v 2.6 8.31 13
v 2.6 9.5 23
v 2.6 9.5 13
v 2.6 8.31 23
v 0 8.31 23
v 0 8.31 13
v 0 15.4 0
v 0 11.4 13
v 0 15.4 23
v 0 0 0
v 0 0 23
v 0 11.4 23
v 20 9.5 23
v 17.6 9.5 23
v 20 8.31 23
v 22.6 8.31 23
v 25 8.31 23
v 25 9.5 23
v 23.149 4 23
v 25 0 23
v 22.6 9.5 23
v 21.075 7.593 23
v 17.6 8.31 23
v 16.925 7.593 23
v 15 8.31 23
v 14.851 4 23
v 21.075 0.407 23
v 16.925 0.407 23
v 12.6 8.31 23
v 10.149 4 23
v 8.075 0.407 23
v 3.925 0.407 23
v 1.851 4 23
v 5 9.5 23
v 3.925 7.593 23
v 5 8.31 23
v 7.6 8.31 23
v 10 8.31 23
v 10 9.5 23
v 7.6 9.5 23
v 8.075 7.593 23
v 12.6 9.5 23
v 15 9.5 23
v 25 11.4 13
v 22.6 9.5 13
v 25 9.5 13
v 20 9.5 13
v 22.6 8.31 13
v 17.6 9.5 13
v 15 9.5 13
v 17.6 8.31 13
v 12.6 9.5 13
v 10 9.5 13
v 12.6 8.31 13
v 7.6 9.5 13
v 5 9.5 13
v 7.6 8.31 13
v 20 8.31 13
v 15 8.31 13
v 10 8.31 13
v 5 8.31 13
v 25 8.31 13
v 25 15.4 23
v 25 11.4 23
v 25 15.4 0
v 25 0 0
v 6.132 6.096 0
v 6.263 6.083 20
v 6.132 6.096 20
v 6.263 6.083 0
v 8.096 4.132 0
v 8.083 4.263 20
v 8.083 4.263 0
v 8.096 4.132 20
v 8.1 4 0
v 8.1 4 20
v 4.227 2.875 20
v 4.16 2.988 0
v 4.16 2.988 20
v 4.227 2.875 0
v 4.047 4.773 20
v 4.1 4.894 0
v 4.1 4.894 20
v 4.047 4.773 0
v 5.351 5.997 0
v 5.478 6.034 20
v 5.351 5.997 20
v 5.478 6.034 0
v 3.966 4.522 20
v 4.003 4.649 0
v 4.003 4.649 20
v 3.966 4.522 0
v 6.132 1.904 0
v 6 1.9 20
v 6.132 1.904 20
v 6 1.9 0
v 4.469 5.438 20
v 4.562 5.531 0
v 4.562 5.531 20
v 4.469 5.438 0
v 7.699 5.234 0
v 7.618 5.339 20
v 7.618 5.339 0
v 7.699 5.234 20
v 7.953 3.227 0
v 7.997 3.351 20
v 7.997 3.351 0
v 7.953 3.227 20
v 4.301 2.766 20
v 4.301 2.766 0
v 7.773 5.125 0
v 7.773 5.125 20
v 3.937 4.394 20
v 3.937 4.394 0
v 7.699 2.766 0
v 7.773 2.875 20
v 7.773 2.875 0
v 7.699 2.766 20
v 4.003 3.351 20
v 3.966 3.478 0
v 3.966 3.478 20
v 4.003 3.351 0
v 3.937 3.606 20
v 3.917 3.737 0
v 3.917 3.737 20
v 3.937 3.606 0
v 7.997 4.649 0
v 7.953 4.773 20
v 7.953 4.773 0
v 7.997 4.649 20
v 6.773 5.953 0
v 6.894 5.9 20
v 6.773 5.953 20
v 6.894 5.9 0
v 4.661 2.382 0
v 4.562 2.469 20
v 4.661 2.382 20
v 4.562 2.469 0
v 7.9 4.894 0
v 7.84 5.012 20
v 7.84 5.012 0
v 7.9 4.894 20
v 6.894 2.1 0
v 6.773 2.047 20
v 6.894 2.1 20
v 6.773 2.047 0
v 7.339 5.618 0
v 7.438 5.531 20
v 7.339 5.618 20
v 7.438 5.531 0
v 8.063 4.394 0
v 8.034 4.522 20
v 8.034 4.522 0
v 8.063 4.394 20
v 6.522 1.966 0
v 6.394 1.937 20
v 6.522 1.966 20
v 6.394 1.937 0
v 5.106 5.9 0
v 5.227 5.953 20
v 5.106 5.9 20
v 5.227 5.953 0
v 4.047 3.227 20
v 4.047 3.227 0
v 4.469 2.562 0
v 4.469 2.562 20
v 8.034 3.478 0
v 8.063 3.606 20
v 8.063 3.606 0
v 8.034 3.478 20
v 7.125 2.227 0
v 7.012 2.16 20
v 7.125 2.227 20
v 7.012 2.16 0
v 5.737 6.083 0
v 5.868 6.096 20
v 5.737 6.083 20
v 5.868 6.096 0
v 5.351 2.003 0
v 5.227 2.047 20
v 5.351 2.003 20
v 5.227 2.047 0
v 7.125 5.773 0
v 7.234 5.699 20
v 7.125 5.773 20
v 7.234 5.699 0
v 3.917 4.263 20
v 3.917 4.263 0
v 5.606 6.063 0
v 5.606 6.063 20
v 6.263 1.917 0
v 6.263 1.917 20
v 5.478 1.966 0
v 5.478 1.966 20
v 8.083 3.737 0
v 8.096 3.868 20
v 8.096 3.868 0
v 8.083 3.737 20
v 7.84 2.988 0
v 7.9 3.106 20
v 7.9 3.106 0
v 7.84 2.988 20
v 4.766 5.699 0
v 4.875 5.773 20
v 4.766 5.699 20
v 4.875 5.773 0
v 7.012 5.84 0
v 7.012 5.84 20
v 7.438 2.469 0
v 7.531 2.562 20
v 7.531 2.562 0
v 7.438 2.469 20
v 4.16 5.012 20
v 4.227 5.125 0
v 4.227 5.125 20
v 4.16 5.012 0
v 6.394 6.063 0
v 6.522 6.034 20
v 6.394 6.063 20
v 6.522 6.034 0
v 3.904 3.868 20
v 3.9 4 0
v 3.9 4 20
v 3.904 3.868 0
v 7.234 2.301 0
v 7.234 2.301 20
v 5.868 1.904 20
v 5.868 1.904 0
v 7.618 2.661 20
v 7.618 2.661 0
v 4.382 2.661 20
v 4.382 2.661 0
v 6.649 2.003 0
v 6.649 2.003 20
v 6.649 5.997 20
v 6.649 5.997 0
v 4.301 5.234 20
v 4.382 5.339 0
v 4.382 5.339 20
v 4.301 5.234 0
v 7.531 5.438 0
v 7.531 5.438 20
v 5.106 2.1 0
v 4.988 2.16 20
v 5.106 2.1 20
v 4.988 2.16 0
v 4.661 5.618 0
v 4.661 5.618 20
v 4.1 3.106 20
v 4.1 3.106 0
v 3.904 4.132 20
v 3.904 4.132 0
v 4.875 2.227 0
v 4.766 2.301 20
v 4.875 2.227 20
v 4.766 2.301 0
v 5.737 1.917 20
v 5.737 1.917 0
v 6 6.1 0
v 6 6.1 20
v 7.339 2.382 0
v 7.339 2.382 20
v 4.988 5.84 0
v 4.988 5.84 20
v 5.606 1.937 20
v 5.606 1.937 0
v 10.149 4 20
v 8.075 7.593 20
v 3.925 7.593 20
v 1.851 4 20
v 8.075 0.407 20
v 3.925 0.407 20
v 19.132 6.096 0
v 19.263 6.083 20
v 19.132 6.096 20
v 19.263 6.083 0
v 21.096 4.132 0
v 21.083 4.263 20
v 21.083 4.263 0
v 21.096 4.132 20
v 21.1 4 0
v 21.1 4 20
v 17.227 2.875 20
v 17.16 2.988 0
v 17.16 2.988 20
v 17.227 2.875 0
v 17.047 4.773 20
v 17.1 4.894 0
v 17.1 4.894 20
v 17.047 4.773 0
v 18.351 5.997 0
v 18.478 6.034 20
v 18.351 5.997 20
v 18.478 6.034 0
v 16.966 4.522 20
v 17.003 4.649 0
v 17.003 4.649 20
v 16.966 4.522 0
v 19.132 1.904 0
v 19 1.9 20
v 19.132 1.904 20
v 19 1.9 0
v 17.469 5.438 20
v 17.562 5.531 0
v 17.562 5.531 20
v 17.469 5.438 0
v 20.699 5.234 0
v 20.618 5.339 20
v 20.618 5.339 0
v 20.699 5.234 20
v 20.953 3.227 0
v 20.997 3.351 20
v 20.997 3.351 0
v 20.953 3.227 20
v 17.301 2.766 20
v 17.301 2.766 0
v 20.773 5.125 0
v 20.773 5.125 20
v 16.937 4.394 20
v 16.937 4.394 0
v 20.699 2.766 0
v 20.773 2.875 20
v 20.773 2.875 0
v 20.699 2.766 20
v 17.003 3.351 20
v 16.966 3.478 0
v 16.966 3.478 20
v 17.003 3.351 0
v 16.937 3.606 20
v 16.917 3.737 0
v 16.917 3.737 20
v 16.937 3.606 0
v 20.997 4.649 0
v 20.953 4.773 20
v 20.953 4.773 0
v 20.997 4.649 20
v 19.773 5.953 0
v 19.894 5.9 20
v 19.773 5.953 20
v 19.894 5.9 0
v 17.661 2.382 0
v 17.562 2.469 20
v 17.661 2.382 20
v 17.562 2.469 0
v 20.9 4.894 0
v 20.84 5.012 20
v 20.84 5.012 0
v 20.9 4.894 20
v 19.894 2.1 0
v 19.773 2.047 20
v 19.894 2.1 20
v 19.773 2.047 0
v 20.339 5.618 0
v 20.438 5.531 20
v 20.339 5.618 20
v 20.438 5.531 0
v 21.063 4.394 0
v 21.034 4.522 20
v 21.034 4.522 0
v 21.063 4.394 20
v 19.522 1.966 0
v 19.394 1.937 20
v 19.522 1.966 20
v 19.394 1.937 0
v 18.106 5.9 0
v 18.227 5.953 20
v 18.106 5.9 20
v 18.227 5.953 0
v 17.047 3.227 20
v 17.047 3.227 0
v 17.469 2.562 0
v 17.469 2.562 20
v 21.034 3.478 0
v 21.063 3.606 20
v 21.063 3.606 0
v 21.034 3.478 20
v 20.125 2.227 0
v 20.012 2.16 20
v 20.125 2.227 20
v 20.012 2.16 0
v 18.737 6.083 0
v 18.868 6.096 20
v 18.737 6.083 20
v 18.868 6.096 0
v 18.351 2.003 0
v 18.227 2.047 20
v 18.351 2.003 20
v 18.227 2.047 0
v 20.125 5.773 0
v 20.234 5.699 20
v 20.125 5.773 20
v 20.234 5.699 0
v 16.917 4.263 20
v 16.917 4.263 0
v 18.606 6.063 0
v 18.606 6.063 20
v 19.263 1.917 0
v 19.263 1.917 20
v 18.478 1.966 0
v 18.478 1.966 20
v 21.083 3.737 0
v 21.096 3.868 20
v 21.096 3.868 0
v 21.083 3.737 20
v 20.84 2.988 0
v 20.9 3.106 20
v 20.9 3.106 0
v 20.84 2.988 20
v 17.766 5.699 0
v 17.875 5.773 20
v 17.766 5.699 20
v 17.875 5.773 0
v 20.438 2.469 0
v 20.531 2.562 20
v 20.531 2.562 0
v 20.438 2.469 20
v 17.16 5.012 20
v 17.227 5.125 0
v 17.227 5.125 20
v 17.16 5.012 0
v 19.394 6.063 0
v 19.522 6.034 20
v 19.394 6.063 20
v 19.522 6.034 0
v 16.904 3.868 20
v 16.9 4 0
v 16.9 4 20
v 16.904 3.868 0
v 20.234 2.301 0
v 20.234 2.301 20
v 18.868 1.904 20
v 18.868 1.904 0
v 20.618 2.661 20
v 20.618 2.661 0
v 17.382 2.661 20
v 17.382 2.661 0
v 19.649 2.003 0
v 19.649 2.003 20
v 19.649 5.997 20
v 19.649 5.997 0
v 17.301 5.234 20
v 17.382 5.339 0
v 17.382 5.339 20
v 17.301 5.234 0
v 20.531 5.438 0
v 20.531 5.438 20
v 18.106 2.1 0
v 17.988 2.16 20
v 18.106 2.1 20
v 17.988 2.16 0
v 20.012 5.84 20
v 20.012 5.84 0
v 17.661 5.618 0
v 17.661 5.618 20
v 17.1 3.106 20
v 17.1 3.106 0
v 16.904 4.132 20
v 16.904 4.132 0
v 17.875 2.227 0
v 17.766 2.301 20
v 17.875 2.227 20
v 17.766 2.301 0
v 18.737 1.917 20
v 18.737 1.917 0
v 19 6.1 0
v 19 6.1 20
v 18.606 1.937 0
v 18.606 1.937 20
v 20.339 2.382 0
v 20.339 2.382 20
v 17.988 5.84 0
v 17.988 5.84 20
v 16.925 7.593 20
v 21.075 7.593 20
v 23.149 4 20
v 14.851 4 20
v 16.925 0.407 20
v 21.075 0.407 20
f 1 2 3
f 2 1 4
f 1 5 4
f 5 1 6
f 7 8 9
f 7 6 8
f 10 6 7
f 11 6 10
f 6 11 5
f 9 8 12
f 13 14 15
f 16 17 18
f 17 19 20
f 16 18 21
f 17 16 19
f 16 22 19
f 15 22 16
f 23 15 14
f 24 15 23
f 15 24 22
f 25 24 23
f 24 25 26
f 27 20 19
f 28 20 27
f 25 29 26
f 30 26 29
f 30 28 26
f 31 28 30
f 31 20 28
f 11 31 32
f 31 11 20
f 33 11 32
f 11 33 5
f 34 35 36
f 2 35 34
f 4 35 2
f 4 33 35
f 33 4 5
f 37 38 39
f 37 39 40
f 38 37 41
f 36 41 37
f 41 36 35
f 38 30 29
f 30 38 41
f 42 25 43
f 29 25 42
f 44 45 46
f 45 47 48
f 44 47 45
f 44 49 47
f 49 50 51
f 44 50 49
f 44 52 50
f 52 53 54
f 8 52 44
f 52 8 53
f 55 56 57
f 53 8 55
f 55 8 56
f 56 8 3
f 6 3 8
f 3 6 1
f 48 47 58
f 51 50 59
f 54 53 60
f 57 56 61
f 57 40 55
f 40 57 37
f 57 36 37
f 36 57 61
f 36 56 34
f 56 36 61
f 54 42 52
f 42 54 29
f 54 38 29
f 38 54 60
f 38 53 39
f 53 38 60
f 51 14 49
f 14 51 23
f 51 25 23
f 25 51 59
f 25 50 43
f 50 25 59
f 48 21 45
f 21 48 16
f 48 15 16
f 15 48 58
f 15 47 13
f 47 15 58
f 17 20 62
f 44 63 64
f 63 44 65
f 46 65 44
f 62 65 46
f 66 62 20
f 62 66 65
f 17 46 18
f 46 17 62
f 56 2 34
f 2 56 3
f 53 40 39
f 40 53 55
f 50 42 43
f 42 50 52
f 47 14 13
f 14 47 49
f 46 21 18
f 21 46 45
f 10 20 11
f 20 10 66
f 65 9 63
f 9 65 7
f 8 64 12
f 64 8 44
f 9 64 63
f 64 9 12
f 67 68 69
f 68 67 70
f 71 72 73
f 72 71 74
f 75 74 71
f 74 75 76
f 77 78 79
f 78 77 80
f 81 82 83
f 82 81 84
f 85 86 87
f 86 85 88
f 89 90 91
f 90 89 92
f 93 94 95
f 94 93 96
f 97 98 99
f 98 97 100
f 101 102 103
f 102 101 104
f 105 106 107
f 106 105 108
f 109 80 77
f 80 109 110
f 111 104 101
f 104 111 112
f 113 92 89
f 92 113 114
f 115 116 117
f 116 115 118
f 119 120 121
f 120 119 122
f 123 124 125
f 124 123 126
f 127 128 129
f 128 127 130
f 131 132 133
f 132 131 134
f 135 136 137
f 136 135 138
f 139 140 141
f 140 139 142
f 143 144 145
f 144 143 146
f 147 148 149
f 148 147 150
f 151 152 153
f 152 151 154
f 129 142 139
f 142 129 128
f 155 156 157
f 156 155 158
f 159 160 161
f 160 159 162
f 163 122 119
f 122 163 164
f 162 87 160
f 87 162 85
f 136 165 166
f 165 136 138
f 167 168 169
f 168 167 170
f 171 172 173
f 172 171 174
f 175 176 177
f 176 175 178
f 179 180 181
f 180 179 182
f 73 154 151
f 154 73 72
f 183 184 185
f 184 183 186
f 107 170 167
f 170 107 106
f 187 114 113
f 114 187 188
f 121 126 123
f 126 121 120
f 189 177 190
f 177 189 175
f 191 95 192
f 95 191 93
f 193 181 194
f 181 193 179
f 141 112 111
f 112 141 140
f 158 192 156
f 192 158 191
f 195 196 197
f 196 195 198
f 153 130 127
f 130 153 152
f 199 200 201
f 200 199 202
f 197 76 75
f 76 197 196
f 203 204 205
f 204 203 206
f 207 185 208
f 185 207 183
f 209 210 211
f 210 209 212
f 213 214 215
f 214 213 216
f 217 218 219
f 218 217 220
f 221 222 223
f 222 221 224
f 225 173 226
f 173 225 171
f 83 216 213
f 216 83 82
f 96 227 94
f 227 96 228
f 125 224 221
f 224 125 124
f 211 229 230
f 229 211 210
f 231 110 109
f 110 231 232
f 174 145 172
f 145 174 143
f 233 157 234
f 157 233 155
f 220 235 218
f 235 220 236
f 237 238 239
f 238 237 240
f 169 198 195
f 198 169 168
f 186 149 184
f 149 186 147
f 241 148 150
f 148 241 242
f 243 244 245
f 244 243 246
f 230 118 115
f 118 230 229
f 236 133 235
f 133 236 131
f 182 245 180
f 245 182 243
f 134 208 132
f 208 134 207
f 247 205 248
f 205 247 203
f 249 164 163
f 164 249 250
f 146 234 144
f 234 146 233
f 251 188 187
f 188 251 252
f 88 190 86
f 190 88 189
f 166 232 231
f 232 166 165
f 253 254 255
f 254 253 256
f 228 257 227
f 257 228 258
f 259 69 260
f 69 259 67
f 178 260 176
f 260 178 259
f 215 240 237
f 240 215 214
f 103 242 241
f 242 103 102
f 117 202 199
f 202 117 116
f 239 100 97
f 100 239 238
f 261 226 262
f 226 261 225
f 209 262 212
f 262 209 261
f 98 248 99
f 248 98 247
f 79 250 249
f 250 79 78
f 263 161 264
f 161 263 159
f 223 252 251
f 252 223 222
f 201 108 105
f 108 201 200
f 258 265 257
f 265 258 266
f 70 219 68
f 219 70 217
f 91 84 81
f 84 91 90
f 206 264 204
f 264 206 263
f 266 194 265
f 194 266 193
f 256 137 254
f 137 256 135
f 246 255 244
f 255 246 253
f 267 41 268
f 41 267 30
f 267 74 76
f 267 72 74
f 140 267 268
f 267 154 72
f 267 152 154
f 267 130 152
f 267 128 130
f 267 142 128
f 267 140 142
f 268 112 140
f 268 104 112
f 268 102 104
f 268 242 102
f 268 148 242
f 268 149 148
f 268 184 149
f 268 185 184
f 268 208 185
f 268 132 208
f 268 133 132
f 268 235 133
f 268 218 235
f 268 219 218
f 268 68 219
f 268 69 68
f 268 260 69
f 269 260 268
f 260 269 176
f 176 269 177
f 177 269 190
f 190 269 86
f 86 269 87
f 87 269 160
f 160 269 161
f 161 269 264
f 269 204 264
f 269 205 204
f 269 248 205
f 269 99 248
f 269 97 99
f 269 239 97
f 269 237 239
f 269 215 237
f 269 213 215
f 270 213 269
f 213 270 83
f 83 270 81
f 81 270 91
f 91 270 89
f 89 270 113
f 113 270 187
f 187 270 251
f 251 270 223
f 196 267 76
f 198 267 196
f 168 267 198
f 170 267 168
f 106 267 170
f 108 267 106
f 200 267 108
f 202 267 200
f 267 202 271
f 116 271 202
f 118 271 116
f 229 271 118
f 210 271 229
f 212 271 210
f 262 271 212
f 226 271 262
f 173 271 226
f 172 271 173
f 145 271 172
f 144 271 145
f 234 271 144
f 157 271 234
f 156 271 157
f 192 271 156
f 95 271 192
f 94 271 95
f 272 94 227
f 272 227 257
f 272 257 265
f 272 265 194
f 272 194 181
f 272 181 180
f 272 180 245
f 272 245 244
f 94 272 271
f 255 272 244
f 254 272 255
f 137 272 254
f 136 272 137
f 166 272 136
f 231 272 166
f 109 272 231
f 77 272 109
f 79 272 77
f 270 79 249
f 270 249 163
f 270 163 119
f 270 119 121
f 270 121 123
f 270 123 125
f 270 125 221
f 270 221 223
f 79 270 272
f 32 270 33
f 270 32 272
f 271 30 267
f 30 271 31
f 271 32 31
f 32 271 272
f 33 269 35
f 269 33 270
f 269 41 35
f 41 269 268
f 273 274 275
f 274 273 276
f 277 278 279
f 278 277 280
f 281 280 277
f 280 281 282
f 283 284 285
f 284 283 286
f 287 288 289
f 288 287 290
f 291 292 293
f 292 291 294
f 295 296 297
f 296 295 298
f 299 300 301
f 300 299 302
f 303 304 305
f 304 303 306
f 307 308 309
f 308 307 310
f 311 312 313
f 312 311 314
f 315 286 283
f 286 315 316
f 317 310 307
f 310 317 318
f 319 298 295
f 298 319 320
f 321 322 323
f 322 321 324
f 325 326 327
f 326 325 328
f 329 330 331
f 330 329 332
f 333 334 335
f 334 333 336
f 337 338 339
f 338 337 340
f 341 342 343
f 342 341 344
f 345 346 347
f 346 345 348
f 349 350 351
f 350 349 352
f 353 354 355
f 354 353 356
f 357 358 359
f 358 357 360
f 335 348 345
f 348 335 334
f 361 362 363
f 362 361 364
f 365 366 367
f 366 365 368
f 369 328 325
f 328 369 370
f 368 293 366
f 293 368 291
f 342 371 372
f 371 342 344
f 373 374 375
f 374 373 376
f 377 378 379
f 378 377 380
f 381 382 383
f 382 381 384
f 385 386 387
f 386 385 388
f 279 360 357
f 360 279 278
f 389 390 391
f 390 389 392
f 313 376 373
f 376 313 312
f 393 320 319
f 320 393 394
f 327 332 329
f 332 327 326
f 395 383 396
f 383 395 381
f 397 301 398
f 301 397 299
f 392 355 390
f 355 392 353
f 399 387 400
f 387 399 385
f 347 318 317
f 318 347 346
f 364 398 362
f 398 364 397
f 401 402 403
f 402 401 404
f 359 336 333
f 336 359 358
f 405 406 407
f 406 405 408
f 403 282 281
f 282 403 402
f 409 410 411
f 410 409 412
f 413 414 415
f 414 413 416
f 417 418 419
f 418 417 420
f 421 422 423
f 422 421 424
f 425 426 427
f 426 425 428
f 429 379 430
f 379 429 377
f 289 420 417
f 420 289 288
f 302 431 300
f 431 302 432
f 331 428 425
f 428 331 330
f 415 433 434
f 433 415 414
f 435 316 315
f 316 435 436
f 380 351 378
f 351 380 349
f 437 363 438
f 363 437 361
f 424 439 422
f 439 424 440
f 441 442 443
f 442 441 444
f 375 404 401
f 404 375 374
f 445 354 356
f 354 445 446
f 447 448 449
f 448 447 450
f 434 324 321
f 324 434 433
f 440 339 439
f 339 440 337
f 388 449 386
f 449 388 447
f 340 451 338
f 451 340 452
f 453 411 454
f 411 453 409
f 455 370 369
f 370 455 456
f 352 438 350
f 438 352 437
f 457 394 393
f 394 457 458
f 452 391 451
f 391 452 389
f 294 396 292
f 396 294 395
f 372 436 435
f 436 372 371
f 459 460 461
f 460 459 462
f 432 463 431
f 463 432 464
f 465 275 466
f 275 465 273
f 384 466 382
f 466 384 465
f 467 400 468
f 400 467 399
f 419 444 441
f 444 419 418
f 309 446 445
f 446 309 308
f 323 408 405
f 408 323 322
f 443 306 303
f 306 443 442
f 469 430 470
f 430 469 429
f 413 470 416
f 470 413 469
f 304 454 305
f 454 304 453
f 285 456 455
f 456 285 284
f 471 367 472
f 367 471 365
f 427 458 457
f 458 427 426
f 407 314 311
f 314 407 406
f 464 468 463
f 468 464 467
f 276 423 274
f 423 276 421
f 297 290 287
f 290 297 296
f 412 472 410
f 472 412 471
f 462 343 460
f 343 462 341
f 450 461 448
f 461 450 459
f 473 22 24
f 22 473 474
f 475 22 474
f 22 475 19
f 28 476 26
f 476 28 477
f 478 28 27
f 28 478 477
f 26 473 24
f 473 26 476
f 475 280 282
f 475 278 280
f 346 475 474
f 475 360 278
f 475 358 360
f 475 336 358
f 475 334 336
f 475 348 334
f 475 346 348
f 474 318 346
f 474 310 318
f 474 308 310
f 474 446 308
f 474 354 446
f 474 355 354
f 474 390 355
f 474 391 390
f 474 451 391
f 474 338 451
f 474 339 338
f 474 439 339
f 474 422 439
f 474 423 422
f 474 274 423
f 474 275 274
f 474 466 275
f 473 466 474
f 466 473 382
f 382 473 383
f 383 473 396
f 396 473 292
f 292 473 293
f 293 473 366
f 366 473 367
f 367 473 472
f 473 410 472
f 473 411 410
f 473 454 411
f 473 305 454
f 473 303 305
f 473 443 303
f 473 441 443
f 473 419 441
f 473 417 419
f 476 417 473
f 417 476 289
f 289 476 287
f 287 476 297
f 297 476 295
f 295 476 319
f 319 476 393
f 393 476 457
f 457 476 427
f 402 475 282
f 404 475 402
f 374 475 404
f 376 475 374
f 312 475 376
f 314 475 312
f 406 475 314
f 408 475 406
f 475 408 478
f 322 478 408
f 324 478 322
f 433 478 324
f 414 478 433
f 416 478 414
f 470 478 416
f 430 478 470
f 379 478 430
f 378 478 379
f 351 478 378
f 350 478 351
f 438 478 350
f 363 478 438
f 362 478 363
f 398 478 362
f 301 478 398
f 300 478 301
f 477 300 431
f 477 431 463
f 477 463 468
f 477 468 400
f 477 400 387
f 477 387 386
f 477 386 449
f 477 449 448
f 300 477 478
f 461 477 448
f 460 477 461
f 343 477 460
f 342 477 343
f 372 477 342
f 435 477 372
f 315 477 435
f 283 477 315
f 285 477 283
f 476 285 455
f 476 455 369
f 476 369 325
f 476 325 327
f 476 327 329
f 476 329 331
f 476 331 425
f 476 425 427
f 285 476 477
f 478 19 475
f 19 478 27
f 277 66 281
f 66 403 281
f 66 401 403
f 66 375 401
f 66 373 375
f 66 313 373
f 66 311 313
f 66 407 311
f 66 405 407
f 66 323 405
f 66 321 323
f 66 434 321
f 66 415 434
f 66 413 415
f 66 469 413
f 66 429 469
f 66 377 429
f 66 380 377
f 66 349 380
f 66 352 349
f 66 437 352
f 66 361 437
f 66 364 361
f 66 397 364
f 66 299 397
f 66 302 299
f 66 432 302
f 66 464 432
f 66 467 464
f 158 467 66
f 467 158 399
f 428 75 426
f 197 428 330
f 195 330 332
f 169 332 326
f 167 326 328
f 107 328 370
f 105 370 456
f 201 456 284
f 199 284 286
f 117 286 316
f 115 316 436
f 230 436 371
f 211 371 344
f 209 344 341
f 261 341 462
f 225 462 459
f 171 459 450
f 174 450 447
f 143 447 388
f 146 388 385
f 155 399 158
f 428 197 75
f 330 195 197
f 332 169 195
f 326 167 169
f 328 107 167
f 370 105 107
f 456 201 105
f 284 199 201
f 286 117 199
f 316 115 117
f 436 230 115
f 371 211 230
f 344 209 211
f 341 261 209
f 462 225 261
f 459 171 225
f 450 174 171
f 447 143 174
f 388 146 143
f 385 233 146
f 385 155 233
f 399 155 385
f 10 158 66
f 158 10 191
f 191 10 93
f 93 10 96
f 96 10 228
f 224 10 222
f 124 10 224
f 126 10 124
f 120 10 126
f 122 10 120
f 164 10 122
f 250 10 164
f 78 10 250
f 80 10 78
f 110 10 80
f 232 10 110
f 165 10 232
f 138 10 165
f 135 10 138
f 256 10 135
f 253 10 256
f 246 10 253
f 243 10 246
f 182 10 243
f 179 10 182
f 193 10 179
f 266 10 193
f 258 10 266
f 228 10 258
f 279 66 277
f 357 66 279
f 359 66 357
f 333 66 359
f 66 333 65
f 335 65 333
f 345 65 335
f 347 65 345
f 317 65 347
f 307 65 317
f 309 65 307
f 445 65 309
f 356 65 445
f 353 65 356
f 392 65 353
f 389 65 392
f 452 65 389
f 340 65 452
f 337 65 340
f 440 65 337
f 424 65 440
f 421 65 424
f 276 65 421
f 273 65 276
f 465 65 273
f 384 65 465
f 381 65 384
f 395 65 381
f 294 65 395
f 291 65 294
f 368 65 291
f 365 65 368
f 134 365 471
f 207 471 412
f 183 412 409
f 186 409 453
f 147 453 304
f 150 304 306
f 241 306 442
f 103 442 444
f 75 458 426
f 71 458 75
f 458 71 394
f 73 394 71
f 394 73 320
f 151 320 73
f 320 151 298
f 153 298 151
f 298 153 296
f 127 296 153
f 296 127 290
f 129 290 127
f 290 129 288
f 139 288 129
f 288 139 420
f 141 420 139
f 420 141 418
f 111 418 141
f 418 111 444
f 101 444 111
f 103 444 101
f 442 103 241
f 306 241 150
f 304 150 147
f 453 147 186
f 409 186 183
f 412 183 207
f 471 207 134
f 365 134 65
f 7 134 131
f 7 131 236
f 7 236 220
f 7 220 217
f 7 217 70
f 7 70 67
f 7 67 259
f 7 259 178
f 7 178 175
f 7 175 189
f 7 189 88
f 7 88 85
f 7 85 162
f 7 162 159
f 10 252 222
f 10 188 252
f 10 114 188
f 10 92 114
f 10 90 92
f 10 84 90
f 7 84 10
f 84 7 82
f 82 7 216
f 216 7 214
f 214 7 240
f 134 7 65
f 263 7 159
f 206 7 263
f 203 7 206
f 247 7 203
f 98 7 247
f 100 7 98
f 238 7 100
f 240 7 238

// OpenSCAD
// Y-belt retainer/tensioner
// May 2012 John Newman

// This parameter deterimes how far the belt is held above the deck
dRise = 0;			// Added to the depth to make the belt run horizontal

// Belt dimensions - These are for T2.5, see below for T5
//tBase = 1.25;		// Thickness of belt base
//tFull = 2.0;			// Thickness of Belt at teeth
//wTooth = 1.4;		// Width of tooth (not actual, req)
//wSpace = 1.1;		// Width of space
//wBelt = 6.2;		// Width of belt

// Belt dimensions - These are for T5
tBase = 1.5;		// Thickness of belt base
tFull = 2.7;			// Thickness of Belt at teeth
wTooth = 2.6;		// Width of tooth (not actual, req)
wSpace = 2.4;		// Width of space
wBelt = 10;		// Width of belt


// Misc params
wHex = 6.9;		// Width of trap for hex nut
dHex	= 2.5;			// Depth of trap for hex nut
rM3 = 1.7;			// Radius of M3 bolt hole
sDrop = wHex/2-0.5; //2.8;		// Driver screw drop from base of slider
Adjust = 0.5;		// Spacing for things to fit inside other things!
pWidth = 9;			// Screw platform width
pHeight = 5;		// Screw platform height

// Base parameters
bwExt = 20;		// Widest part of base
bwInt = 15;			// inside width, where slider goes
blExt = 30;			// Overall length of base
blHed = 6;			// Head of base whch takes the strain !
bdExt = 12.5;		// This included a minimum floor thickness of 2mm (?)
bRoof = 2.8;		// The thickness of the roof which holds the slider in
bFloor = 1;			// The thickness of the floor under the slider (minimum)
bdSoc = bdExt-(bRoof+bFloor);		// 'Socket' depth for slider to go in

// Slider parameters
swMax = bwInt - Adjust;	// Wide part of slider
sdMax = bdSoc-Adjust;		// Height of slider

lBelt = blExt*2;		// Length of a bit of belt!
rMsk = blExt/3 ;		// Radius of part of mount masking...

module sliderpart() {
	difference() {
		cube([blExt-blHed,swMax,sdMax],center=true);
		// Make a hole for the bolt end
	//	translate([(blExt-blHed)/2-2,0,(sdMax/2)-sDrop]) rotate([30,0,0]) rotate([0,90,0]) cylinder(10,rM3+0.5,rM3+0.5,$fn=6);
		// Make a fracture to cause fill
		translate([(blExt-blHed)/2-4.2,0,(sdMax-tFull)/2+1]) cube([0.05,swMax-4.4,sdMax],center=true) ;
		// Finally indent for belt
		translate([-lBelt/2,-wBelt/2,-sdMax/2-0.1]) belt();
	}
}

// Note this is positioned so that the slider is centered on the XY plane
module basepart() {
	union() {
		difference() {
			translate([0,0,-dRise/2]) cube([blExt,bwExt,bdExt+dRise],center=true);
			// Remove the space for the slider
			translate([-blHed,0,(bFloor-bRoof)/2]) cube([blExt,bwInt,bdSoc],center=true);
			// Remove a hole for the bolt
			translate([(blExt/2-9),0,bFloor+sDrop-bdExt/2]) rotate([30,0,0]) rotate([0,90,0]) cylinder(15,rM3,rM3);
			// An indentation for the bolt head
			translate([(blExt/2)-(blHed+5-dHex),0,bFloor+sDrop-bdExt/2]) rotate([30,0,0]) rotate([0,90,0]) cylinder(5,wHex/2,wHex/2,$fn=6);
			// A slot for the belt to come through
			translate([blExt/2-blHed,0,(bdExt-tFull-0.61)/2-bRoof]) cube([15,wBelt+2,tFull+0.6],center=true);
		}
		translate([0,bwExt/2 + (pWidth/2-0.01),-bdExt/2+pHeight/2]) screwmount() ;
		translate([0,-(bwExt/2 + (pWidth/2-0.01)),-bdExt/2+pHeight/2]) screwmount() ;
	}
}

module belt() {
	cube([lBelt,wBelt,tBase]) ;
	for (inc = [0:(wTooth+wSpace):lBelt-wTooth]) translate([inc,0,tBase-0.01]) cube([wTooth,wBelt,(tFull-tBase)]) ;
}

module screwmount() {
	difference() {
		cube([blExt,pWidth,pHeight],center=true);
		// Bolt holes
		translate([(blExt-pWidth)/2,0,-(pHeight/2+1)]) rotate([0,0,30]) cylinder(pHeight+2,rM3,rM3,$fn=6);
		translate([-(blExt-pWidth)/2,0,-(pHeight/2+1)]) rotate([0,0,30]) cylinder(pHeight+2,rM3,rM3,$fn=6);
		// Nut traps
		translate([(blExt-pWidth)/2,0,pHeight/2-dHex-0.01]) rotate([0,0,30]) cylinder(5,wHex/2,wHex/2,$fn=6);
		translate([-(blExt-pWidth)/2,0,pHeight/2-dHex-0.01]) rotate([0,0,30]) cylinder(5,wHex/2,wHex/2,$fn=6);
	}
}



// ---- this is the only thing I've done, just using the belt shape for 
// ---- my purposes here, misan.

//standard was 4
ExtraHeight = 9;

translate([0,0,ExtraHeight]){ //raise slit another 4 mm
  translate([0,0,14]) rotate([-90,0,0]) difference() {
	union() {
	translate([0,10,0]) cube([25,4,15.4]);
	translate([0,0,11.4]) cube([25,14,4]);
		difference() {
			cube([25,14,10]);
			translate([0,10,11]) 			rotate([180,0,0])  belt();
		}
	}

    nutsize=7.1; //was 7.1
    
    //two screws and nuts
	translate([6,25,4]) rotate([90,0,0]) cylinder(d=4.2, h=30,$fn=100);
	translate([6,3,4]) rotate([90,0,0]) rotate([0,0,0]) cylinder(r=nutsize / cos(180 / 6) / 2 + 0.05, h=5,$fn=6);
     
	translate([19,25,4]) rotate([90,0,0]) cylinder(d=4.2, h=30,$fn=100);
	translate([19,3,4]) rotate([90,0,0]) rotate([0,0,0]) cylinder(r=nutsize / cos(180 / 6) / 2 + 0.05, h=5,$fn=6);
  }
}


difference(){
translate([0,0,0])cube([25,15.4,ExtraHeight+0.01]); //add fraction to make 'manifold'
translate([6,4,-1]) cylinder(d=4.2, h=30,$fn=100);
translate([19,4,-1]) cylinder(d=4.2, h=30,$fn=100);
}
